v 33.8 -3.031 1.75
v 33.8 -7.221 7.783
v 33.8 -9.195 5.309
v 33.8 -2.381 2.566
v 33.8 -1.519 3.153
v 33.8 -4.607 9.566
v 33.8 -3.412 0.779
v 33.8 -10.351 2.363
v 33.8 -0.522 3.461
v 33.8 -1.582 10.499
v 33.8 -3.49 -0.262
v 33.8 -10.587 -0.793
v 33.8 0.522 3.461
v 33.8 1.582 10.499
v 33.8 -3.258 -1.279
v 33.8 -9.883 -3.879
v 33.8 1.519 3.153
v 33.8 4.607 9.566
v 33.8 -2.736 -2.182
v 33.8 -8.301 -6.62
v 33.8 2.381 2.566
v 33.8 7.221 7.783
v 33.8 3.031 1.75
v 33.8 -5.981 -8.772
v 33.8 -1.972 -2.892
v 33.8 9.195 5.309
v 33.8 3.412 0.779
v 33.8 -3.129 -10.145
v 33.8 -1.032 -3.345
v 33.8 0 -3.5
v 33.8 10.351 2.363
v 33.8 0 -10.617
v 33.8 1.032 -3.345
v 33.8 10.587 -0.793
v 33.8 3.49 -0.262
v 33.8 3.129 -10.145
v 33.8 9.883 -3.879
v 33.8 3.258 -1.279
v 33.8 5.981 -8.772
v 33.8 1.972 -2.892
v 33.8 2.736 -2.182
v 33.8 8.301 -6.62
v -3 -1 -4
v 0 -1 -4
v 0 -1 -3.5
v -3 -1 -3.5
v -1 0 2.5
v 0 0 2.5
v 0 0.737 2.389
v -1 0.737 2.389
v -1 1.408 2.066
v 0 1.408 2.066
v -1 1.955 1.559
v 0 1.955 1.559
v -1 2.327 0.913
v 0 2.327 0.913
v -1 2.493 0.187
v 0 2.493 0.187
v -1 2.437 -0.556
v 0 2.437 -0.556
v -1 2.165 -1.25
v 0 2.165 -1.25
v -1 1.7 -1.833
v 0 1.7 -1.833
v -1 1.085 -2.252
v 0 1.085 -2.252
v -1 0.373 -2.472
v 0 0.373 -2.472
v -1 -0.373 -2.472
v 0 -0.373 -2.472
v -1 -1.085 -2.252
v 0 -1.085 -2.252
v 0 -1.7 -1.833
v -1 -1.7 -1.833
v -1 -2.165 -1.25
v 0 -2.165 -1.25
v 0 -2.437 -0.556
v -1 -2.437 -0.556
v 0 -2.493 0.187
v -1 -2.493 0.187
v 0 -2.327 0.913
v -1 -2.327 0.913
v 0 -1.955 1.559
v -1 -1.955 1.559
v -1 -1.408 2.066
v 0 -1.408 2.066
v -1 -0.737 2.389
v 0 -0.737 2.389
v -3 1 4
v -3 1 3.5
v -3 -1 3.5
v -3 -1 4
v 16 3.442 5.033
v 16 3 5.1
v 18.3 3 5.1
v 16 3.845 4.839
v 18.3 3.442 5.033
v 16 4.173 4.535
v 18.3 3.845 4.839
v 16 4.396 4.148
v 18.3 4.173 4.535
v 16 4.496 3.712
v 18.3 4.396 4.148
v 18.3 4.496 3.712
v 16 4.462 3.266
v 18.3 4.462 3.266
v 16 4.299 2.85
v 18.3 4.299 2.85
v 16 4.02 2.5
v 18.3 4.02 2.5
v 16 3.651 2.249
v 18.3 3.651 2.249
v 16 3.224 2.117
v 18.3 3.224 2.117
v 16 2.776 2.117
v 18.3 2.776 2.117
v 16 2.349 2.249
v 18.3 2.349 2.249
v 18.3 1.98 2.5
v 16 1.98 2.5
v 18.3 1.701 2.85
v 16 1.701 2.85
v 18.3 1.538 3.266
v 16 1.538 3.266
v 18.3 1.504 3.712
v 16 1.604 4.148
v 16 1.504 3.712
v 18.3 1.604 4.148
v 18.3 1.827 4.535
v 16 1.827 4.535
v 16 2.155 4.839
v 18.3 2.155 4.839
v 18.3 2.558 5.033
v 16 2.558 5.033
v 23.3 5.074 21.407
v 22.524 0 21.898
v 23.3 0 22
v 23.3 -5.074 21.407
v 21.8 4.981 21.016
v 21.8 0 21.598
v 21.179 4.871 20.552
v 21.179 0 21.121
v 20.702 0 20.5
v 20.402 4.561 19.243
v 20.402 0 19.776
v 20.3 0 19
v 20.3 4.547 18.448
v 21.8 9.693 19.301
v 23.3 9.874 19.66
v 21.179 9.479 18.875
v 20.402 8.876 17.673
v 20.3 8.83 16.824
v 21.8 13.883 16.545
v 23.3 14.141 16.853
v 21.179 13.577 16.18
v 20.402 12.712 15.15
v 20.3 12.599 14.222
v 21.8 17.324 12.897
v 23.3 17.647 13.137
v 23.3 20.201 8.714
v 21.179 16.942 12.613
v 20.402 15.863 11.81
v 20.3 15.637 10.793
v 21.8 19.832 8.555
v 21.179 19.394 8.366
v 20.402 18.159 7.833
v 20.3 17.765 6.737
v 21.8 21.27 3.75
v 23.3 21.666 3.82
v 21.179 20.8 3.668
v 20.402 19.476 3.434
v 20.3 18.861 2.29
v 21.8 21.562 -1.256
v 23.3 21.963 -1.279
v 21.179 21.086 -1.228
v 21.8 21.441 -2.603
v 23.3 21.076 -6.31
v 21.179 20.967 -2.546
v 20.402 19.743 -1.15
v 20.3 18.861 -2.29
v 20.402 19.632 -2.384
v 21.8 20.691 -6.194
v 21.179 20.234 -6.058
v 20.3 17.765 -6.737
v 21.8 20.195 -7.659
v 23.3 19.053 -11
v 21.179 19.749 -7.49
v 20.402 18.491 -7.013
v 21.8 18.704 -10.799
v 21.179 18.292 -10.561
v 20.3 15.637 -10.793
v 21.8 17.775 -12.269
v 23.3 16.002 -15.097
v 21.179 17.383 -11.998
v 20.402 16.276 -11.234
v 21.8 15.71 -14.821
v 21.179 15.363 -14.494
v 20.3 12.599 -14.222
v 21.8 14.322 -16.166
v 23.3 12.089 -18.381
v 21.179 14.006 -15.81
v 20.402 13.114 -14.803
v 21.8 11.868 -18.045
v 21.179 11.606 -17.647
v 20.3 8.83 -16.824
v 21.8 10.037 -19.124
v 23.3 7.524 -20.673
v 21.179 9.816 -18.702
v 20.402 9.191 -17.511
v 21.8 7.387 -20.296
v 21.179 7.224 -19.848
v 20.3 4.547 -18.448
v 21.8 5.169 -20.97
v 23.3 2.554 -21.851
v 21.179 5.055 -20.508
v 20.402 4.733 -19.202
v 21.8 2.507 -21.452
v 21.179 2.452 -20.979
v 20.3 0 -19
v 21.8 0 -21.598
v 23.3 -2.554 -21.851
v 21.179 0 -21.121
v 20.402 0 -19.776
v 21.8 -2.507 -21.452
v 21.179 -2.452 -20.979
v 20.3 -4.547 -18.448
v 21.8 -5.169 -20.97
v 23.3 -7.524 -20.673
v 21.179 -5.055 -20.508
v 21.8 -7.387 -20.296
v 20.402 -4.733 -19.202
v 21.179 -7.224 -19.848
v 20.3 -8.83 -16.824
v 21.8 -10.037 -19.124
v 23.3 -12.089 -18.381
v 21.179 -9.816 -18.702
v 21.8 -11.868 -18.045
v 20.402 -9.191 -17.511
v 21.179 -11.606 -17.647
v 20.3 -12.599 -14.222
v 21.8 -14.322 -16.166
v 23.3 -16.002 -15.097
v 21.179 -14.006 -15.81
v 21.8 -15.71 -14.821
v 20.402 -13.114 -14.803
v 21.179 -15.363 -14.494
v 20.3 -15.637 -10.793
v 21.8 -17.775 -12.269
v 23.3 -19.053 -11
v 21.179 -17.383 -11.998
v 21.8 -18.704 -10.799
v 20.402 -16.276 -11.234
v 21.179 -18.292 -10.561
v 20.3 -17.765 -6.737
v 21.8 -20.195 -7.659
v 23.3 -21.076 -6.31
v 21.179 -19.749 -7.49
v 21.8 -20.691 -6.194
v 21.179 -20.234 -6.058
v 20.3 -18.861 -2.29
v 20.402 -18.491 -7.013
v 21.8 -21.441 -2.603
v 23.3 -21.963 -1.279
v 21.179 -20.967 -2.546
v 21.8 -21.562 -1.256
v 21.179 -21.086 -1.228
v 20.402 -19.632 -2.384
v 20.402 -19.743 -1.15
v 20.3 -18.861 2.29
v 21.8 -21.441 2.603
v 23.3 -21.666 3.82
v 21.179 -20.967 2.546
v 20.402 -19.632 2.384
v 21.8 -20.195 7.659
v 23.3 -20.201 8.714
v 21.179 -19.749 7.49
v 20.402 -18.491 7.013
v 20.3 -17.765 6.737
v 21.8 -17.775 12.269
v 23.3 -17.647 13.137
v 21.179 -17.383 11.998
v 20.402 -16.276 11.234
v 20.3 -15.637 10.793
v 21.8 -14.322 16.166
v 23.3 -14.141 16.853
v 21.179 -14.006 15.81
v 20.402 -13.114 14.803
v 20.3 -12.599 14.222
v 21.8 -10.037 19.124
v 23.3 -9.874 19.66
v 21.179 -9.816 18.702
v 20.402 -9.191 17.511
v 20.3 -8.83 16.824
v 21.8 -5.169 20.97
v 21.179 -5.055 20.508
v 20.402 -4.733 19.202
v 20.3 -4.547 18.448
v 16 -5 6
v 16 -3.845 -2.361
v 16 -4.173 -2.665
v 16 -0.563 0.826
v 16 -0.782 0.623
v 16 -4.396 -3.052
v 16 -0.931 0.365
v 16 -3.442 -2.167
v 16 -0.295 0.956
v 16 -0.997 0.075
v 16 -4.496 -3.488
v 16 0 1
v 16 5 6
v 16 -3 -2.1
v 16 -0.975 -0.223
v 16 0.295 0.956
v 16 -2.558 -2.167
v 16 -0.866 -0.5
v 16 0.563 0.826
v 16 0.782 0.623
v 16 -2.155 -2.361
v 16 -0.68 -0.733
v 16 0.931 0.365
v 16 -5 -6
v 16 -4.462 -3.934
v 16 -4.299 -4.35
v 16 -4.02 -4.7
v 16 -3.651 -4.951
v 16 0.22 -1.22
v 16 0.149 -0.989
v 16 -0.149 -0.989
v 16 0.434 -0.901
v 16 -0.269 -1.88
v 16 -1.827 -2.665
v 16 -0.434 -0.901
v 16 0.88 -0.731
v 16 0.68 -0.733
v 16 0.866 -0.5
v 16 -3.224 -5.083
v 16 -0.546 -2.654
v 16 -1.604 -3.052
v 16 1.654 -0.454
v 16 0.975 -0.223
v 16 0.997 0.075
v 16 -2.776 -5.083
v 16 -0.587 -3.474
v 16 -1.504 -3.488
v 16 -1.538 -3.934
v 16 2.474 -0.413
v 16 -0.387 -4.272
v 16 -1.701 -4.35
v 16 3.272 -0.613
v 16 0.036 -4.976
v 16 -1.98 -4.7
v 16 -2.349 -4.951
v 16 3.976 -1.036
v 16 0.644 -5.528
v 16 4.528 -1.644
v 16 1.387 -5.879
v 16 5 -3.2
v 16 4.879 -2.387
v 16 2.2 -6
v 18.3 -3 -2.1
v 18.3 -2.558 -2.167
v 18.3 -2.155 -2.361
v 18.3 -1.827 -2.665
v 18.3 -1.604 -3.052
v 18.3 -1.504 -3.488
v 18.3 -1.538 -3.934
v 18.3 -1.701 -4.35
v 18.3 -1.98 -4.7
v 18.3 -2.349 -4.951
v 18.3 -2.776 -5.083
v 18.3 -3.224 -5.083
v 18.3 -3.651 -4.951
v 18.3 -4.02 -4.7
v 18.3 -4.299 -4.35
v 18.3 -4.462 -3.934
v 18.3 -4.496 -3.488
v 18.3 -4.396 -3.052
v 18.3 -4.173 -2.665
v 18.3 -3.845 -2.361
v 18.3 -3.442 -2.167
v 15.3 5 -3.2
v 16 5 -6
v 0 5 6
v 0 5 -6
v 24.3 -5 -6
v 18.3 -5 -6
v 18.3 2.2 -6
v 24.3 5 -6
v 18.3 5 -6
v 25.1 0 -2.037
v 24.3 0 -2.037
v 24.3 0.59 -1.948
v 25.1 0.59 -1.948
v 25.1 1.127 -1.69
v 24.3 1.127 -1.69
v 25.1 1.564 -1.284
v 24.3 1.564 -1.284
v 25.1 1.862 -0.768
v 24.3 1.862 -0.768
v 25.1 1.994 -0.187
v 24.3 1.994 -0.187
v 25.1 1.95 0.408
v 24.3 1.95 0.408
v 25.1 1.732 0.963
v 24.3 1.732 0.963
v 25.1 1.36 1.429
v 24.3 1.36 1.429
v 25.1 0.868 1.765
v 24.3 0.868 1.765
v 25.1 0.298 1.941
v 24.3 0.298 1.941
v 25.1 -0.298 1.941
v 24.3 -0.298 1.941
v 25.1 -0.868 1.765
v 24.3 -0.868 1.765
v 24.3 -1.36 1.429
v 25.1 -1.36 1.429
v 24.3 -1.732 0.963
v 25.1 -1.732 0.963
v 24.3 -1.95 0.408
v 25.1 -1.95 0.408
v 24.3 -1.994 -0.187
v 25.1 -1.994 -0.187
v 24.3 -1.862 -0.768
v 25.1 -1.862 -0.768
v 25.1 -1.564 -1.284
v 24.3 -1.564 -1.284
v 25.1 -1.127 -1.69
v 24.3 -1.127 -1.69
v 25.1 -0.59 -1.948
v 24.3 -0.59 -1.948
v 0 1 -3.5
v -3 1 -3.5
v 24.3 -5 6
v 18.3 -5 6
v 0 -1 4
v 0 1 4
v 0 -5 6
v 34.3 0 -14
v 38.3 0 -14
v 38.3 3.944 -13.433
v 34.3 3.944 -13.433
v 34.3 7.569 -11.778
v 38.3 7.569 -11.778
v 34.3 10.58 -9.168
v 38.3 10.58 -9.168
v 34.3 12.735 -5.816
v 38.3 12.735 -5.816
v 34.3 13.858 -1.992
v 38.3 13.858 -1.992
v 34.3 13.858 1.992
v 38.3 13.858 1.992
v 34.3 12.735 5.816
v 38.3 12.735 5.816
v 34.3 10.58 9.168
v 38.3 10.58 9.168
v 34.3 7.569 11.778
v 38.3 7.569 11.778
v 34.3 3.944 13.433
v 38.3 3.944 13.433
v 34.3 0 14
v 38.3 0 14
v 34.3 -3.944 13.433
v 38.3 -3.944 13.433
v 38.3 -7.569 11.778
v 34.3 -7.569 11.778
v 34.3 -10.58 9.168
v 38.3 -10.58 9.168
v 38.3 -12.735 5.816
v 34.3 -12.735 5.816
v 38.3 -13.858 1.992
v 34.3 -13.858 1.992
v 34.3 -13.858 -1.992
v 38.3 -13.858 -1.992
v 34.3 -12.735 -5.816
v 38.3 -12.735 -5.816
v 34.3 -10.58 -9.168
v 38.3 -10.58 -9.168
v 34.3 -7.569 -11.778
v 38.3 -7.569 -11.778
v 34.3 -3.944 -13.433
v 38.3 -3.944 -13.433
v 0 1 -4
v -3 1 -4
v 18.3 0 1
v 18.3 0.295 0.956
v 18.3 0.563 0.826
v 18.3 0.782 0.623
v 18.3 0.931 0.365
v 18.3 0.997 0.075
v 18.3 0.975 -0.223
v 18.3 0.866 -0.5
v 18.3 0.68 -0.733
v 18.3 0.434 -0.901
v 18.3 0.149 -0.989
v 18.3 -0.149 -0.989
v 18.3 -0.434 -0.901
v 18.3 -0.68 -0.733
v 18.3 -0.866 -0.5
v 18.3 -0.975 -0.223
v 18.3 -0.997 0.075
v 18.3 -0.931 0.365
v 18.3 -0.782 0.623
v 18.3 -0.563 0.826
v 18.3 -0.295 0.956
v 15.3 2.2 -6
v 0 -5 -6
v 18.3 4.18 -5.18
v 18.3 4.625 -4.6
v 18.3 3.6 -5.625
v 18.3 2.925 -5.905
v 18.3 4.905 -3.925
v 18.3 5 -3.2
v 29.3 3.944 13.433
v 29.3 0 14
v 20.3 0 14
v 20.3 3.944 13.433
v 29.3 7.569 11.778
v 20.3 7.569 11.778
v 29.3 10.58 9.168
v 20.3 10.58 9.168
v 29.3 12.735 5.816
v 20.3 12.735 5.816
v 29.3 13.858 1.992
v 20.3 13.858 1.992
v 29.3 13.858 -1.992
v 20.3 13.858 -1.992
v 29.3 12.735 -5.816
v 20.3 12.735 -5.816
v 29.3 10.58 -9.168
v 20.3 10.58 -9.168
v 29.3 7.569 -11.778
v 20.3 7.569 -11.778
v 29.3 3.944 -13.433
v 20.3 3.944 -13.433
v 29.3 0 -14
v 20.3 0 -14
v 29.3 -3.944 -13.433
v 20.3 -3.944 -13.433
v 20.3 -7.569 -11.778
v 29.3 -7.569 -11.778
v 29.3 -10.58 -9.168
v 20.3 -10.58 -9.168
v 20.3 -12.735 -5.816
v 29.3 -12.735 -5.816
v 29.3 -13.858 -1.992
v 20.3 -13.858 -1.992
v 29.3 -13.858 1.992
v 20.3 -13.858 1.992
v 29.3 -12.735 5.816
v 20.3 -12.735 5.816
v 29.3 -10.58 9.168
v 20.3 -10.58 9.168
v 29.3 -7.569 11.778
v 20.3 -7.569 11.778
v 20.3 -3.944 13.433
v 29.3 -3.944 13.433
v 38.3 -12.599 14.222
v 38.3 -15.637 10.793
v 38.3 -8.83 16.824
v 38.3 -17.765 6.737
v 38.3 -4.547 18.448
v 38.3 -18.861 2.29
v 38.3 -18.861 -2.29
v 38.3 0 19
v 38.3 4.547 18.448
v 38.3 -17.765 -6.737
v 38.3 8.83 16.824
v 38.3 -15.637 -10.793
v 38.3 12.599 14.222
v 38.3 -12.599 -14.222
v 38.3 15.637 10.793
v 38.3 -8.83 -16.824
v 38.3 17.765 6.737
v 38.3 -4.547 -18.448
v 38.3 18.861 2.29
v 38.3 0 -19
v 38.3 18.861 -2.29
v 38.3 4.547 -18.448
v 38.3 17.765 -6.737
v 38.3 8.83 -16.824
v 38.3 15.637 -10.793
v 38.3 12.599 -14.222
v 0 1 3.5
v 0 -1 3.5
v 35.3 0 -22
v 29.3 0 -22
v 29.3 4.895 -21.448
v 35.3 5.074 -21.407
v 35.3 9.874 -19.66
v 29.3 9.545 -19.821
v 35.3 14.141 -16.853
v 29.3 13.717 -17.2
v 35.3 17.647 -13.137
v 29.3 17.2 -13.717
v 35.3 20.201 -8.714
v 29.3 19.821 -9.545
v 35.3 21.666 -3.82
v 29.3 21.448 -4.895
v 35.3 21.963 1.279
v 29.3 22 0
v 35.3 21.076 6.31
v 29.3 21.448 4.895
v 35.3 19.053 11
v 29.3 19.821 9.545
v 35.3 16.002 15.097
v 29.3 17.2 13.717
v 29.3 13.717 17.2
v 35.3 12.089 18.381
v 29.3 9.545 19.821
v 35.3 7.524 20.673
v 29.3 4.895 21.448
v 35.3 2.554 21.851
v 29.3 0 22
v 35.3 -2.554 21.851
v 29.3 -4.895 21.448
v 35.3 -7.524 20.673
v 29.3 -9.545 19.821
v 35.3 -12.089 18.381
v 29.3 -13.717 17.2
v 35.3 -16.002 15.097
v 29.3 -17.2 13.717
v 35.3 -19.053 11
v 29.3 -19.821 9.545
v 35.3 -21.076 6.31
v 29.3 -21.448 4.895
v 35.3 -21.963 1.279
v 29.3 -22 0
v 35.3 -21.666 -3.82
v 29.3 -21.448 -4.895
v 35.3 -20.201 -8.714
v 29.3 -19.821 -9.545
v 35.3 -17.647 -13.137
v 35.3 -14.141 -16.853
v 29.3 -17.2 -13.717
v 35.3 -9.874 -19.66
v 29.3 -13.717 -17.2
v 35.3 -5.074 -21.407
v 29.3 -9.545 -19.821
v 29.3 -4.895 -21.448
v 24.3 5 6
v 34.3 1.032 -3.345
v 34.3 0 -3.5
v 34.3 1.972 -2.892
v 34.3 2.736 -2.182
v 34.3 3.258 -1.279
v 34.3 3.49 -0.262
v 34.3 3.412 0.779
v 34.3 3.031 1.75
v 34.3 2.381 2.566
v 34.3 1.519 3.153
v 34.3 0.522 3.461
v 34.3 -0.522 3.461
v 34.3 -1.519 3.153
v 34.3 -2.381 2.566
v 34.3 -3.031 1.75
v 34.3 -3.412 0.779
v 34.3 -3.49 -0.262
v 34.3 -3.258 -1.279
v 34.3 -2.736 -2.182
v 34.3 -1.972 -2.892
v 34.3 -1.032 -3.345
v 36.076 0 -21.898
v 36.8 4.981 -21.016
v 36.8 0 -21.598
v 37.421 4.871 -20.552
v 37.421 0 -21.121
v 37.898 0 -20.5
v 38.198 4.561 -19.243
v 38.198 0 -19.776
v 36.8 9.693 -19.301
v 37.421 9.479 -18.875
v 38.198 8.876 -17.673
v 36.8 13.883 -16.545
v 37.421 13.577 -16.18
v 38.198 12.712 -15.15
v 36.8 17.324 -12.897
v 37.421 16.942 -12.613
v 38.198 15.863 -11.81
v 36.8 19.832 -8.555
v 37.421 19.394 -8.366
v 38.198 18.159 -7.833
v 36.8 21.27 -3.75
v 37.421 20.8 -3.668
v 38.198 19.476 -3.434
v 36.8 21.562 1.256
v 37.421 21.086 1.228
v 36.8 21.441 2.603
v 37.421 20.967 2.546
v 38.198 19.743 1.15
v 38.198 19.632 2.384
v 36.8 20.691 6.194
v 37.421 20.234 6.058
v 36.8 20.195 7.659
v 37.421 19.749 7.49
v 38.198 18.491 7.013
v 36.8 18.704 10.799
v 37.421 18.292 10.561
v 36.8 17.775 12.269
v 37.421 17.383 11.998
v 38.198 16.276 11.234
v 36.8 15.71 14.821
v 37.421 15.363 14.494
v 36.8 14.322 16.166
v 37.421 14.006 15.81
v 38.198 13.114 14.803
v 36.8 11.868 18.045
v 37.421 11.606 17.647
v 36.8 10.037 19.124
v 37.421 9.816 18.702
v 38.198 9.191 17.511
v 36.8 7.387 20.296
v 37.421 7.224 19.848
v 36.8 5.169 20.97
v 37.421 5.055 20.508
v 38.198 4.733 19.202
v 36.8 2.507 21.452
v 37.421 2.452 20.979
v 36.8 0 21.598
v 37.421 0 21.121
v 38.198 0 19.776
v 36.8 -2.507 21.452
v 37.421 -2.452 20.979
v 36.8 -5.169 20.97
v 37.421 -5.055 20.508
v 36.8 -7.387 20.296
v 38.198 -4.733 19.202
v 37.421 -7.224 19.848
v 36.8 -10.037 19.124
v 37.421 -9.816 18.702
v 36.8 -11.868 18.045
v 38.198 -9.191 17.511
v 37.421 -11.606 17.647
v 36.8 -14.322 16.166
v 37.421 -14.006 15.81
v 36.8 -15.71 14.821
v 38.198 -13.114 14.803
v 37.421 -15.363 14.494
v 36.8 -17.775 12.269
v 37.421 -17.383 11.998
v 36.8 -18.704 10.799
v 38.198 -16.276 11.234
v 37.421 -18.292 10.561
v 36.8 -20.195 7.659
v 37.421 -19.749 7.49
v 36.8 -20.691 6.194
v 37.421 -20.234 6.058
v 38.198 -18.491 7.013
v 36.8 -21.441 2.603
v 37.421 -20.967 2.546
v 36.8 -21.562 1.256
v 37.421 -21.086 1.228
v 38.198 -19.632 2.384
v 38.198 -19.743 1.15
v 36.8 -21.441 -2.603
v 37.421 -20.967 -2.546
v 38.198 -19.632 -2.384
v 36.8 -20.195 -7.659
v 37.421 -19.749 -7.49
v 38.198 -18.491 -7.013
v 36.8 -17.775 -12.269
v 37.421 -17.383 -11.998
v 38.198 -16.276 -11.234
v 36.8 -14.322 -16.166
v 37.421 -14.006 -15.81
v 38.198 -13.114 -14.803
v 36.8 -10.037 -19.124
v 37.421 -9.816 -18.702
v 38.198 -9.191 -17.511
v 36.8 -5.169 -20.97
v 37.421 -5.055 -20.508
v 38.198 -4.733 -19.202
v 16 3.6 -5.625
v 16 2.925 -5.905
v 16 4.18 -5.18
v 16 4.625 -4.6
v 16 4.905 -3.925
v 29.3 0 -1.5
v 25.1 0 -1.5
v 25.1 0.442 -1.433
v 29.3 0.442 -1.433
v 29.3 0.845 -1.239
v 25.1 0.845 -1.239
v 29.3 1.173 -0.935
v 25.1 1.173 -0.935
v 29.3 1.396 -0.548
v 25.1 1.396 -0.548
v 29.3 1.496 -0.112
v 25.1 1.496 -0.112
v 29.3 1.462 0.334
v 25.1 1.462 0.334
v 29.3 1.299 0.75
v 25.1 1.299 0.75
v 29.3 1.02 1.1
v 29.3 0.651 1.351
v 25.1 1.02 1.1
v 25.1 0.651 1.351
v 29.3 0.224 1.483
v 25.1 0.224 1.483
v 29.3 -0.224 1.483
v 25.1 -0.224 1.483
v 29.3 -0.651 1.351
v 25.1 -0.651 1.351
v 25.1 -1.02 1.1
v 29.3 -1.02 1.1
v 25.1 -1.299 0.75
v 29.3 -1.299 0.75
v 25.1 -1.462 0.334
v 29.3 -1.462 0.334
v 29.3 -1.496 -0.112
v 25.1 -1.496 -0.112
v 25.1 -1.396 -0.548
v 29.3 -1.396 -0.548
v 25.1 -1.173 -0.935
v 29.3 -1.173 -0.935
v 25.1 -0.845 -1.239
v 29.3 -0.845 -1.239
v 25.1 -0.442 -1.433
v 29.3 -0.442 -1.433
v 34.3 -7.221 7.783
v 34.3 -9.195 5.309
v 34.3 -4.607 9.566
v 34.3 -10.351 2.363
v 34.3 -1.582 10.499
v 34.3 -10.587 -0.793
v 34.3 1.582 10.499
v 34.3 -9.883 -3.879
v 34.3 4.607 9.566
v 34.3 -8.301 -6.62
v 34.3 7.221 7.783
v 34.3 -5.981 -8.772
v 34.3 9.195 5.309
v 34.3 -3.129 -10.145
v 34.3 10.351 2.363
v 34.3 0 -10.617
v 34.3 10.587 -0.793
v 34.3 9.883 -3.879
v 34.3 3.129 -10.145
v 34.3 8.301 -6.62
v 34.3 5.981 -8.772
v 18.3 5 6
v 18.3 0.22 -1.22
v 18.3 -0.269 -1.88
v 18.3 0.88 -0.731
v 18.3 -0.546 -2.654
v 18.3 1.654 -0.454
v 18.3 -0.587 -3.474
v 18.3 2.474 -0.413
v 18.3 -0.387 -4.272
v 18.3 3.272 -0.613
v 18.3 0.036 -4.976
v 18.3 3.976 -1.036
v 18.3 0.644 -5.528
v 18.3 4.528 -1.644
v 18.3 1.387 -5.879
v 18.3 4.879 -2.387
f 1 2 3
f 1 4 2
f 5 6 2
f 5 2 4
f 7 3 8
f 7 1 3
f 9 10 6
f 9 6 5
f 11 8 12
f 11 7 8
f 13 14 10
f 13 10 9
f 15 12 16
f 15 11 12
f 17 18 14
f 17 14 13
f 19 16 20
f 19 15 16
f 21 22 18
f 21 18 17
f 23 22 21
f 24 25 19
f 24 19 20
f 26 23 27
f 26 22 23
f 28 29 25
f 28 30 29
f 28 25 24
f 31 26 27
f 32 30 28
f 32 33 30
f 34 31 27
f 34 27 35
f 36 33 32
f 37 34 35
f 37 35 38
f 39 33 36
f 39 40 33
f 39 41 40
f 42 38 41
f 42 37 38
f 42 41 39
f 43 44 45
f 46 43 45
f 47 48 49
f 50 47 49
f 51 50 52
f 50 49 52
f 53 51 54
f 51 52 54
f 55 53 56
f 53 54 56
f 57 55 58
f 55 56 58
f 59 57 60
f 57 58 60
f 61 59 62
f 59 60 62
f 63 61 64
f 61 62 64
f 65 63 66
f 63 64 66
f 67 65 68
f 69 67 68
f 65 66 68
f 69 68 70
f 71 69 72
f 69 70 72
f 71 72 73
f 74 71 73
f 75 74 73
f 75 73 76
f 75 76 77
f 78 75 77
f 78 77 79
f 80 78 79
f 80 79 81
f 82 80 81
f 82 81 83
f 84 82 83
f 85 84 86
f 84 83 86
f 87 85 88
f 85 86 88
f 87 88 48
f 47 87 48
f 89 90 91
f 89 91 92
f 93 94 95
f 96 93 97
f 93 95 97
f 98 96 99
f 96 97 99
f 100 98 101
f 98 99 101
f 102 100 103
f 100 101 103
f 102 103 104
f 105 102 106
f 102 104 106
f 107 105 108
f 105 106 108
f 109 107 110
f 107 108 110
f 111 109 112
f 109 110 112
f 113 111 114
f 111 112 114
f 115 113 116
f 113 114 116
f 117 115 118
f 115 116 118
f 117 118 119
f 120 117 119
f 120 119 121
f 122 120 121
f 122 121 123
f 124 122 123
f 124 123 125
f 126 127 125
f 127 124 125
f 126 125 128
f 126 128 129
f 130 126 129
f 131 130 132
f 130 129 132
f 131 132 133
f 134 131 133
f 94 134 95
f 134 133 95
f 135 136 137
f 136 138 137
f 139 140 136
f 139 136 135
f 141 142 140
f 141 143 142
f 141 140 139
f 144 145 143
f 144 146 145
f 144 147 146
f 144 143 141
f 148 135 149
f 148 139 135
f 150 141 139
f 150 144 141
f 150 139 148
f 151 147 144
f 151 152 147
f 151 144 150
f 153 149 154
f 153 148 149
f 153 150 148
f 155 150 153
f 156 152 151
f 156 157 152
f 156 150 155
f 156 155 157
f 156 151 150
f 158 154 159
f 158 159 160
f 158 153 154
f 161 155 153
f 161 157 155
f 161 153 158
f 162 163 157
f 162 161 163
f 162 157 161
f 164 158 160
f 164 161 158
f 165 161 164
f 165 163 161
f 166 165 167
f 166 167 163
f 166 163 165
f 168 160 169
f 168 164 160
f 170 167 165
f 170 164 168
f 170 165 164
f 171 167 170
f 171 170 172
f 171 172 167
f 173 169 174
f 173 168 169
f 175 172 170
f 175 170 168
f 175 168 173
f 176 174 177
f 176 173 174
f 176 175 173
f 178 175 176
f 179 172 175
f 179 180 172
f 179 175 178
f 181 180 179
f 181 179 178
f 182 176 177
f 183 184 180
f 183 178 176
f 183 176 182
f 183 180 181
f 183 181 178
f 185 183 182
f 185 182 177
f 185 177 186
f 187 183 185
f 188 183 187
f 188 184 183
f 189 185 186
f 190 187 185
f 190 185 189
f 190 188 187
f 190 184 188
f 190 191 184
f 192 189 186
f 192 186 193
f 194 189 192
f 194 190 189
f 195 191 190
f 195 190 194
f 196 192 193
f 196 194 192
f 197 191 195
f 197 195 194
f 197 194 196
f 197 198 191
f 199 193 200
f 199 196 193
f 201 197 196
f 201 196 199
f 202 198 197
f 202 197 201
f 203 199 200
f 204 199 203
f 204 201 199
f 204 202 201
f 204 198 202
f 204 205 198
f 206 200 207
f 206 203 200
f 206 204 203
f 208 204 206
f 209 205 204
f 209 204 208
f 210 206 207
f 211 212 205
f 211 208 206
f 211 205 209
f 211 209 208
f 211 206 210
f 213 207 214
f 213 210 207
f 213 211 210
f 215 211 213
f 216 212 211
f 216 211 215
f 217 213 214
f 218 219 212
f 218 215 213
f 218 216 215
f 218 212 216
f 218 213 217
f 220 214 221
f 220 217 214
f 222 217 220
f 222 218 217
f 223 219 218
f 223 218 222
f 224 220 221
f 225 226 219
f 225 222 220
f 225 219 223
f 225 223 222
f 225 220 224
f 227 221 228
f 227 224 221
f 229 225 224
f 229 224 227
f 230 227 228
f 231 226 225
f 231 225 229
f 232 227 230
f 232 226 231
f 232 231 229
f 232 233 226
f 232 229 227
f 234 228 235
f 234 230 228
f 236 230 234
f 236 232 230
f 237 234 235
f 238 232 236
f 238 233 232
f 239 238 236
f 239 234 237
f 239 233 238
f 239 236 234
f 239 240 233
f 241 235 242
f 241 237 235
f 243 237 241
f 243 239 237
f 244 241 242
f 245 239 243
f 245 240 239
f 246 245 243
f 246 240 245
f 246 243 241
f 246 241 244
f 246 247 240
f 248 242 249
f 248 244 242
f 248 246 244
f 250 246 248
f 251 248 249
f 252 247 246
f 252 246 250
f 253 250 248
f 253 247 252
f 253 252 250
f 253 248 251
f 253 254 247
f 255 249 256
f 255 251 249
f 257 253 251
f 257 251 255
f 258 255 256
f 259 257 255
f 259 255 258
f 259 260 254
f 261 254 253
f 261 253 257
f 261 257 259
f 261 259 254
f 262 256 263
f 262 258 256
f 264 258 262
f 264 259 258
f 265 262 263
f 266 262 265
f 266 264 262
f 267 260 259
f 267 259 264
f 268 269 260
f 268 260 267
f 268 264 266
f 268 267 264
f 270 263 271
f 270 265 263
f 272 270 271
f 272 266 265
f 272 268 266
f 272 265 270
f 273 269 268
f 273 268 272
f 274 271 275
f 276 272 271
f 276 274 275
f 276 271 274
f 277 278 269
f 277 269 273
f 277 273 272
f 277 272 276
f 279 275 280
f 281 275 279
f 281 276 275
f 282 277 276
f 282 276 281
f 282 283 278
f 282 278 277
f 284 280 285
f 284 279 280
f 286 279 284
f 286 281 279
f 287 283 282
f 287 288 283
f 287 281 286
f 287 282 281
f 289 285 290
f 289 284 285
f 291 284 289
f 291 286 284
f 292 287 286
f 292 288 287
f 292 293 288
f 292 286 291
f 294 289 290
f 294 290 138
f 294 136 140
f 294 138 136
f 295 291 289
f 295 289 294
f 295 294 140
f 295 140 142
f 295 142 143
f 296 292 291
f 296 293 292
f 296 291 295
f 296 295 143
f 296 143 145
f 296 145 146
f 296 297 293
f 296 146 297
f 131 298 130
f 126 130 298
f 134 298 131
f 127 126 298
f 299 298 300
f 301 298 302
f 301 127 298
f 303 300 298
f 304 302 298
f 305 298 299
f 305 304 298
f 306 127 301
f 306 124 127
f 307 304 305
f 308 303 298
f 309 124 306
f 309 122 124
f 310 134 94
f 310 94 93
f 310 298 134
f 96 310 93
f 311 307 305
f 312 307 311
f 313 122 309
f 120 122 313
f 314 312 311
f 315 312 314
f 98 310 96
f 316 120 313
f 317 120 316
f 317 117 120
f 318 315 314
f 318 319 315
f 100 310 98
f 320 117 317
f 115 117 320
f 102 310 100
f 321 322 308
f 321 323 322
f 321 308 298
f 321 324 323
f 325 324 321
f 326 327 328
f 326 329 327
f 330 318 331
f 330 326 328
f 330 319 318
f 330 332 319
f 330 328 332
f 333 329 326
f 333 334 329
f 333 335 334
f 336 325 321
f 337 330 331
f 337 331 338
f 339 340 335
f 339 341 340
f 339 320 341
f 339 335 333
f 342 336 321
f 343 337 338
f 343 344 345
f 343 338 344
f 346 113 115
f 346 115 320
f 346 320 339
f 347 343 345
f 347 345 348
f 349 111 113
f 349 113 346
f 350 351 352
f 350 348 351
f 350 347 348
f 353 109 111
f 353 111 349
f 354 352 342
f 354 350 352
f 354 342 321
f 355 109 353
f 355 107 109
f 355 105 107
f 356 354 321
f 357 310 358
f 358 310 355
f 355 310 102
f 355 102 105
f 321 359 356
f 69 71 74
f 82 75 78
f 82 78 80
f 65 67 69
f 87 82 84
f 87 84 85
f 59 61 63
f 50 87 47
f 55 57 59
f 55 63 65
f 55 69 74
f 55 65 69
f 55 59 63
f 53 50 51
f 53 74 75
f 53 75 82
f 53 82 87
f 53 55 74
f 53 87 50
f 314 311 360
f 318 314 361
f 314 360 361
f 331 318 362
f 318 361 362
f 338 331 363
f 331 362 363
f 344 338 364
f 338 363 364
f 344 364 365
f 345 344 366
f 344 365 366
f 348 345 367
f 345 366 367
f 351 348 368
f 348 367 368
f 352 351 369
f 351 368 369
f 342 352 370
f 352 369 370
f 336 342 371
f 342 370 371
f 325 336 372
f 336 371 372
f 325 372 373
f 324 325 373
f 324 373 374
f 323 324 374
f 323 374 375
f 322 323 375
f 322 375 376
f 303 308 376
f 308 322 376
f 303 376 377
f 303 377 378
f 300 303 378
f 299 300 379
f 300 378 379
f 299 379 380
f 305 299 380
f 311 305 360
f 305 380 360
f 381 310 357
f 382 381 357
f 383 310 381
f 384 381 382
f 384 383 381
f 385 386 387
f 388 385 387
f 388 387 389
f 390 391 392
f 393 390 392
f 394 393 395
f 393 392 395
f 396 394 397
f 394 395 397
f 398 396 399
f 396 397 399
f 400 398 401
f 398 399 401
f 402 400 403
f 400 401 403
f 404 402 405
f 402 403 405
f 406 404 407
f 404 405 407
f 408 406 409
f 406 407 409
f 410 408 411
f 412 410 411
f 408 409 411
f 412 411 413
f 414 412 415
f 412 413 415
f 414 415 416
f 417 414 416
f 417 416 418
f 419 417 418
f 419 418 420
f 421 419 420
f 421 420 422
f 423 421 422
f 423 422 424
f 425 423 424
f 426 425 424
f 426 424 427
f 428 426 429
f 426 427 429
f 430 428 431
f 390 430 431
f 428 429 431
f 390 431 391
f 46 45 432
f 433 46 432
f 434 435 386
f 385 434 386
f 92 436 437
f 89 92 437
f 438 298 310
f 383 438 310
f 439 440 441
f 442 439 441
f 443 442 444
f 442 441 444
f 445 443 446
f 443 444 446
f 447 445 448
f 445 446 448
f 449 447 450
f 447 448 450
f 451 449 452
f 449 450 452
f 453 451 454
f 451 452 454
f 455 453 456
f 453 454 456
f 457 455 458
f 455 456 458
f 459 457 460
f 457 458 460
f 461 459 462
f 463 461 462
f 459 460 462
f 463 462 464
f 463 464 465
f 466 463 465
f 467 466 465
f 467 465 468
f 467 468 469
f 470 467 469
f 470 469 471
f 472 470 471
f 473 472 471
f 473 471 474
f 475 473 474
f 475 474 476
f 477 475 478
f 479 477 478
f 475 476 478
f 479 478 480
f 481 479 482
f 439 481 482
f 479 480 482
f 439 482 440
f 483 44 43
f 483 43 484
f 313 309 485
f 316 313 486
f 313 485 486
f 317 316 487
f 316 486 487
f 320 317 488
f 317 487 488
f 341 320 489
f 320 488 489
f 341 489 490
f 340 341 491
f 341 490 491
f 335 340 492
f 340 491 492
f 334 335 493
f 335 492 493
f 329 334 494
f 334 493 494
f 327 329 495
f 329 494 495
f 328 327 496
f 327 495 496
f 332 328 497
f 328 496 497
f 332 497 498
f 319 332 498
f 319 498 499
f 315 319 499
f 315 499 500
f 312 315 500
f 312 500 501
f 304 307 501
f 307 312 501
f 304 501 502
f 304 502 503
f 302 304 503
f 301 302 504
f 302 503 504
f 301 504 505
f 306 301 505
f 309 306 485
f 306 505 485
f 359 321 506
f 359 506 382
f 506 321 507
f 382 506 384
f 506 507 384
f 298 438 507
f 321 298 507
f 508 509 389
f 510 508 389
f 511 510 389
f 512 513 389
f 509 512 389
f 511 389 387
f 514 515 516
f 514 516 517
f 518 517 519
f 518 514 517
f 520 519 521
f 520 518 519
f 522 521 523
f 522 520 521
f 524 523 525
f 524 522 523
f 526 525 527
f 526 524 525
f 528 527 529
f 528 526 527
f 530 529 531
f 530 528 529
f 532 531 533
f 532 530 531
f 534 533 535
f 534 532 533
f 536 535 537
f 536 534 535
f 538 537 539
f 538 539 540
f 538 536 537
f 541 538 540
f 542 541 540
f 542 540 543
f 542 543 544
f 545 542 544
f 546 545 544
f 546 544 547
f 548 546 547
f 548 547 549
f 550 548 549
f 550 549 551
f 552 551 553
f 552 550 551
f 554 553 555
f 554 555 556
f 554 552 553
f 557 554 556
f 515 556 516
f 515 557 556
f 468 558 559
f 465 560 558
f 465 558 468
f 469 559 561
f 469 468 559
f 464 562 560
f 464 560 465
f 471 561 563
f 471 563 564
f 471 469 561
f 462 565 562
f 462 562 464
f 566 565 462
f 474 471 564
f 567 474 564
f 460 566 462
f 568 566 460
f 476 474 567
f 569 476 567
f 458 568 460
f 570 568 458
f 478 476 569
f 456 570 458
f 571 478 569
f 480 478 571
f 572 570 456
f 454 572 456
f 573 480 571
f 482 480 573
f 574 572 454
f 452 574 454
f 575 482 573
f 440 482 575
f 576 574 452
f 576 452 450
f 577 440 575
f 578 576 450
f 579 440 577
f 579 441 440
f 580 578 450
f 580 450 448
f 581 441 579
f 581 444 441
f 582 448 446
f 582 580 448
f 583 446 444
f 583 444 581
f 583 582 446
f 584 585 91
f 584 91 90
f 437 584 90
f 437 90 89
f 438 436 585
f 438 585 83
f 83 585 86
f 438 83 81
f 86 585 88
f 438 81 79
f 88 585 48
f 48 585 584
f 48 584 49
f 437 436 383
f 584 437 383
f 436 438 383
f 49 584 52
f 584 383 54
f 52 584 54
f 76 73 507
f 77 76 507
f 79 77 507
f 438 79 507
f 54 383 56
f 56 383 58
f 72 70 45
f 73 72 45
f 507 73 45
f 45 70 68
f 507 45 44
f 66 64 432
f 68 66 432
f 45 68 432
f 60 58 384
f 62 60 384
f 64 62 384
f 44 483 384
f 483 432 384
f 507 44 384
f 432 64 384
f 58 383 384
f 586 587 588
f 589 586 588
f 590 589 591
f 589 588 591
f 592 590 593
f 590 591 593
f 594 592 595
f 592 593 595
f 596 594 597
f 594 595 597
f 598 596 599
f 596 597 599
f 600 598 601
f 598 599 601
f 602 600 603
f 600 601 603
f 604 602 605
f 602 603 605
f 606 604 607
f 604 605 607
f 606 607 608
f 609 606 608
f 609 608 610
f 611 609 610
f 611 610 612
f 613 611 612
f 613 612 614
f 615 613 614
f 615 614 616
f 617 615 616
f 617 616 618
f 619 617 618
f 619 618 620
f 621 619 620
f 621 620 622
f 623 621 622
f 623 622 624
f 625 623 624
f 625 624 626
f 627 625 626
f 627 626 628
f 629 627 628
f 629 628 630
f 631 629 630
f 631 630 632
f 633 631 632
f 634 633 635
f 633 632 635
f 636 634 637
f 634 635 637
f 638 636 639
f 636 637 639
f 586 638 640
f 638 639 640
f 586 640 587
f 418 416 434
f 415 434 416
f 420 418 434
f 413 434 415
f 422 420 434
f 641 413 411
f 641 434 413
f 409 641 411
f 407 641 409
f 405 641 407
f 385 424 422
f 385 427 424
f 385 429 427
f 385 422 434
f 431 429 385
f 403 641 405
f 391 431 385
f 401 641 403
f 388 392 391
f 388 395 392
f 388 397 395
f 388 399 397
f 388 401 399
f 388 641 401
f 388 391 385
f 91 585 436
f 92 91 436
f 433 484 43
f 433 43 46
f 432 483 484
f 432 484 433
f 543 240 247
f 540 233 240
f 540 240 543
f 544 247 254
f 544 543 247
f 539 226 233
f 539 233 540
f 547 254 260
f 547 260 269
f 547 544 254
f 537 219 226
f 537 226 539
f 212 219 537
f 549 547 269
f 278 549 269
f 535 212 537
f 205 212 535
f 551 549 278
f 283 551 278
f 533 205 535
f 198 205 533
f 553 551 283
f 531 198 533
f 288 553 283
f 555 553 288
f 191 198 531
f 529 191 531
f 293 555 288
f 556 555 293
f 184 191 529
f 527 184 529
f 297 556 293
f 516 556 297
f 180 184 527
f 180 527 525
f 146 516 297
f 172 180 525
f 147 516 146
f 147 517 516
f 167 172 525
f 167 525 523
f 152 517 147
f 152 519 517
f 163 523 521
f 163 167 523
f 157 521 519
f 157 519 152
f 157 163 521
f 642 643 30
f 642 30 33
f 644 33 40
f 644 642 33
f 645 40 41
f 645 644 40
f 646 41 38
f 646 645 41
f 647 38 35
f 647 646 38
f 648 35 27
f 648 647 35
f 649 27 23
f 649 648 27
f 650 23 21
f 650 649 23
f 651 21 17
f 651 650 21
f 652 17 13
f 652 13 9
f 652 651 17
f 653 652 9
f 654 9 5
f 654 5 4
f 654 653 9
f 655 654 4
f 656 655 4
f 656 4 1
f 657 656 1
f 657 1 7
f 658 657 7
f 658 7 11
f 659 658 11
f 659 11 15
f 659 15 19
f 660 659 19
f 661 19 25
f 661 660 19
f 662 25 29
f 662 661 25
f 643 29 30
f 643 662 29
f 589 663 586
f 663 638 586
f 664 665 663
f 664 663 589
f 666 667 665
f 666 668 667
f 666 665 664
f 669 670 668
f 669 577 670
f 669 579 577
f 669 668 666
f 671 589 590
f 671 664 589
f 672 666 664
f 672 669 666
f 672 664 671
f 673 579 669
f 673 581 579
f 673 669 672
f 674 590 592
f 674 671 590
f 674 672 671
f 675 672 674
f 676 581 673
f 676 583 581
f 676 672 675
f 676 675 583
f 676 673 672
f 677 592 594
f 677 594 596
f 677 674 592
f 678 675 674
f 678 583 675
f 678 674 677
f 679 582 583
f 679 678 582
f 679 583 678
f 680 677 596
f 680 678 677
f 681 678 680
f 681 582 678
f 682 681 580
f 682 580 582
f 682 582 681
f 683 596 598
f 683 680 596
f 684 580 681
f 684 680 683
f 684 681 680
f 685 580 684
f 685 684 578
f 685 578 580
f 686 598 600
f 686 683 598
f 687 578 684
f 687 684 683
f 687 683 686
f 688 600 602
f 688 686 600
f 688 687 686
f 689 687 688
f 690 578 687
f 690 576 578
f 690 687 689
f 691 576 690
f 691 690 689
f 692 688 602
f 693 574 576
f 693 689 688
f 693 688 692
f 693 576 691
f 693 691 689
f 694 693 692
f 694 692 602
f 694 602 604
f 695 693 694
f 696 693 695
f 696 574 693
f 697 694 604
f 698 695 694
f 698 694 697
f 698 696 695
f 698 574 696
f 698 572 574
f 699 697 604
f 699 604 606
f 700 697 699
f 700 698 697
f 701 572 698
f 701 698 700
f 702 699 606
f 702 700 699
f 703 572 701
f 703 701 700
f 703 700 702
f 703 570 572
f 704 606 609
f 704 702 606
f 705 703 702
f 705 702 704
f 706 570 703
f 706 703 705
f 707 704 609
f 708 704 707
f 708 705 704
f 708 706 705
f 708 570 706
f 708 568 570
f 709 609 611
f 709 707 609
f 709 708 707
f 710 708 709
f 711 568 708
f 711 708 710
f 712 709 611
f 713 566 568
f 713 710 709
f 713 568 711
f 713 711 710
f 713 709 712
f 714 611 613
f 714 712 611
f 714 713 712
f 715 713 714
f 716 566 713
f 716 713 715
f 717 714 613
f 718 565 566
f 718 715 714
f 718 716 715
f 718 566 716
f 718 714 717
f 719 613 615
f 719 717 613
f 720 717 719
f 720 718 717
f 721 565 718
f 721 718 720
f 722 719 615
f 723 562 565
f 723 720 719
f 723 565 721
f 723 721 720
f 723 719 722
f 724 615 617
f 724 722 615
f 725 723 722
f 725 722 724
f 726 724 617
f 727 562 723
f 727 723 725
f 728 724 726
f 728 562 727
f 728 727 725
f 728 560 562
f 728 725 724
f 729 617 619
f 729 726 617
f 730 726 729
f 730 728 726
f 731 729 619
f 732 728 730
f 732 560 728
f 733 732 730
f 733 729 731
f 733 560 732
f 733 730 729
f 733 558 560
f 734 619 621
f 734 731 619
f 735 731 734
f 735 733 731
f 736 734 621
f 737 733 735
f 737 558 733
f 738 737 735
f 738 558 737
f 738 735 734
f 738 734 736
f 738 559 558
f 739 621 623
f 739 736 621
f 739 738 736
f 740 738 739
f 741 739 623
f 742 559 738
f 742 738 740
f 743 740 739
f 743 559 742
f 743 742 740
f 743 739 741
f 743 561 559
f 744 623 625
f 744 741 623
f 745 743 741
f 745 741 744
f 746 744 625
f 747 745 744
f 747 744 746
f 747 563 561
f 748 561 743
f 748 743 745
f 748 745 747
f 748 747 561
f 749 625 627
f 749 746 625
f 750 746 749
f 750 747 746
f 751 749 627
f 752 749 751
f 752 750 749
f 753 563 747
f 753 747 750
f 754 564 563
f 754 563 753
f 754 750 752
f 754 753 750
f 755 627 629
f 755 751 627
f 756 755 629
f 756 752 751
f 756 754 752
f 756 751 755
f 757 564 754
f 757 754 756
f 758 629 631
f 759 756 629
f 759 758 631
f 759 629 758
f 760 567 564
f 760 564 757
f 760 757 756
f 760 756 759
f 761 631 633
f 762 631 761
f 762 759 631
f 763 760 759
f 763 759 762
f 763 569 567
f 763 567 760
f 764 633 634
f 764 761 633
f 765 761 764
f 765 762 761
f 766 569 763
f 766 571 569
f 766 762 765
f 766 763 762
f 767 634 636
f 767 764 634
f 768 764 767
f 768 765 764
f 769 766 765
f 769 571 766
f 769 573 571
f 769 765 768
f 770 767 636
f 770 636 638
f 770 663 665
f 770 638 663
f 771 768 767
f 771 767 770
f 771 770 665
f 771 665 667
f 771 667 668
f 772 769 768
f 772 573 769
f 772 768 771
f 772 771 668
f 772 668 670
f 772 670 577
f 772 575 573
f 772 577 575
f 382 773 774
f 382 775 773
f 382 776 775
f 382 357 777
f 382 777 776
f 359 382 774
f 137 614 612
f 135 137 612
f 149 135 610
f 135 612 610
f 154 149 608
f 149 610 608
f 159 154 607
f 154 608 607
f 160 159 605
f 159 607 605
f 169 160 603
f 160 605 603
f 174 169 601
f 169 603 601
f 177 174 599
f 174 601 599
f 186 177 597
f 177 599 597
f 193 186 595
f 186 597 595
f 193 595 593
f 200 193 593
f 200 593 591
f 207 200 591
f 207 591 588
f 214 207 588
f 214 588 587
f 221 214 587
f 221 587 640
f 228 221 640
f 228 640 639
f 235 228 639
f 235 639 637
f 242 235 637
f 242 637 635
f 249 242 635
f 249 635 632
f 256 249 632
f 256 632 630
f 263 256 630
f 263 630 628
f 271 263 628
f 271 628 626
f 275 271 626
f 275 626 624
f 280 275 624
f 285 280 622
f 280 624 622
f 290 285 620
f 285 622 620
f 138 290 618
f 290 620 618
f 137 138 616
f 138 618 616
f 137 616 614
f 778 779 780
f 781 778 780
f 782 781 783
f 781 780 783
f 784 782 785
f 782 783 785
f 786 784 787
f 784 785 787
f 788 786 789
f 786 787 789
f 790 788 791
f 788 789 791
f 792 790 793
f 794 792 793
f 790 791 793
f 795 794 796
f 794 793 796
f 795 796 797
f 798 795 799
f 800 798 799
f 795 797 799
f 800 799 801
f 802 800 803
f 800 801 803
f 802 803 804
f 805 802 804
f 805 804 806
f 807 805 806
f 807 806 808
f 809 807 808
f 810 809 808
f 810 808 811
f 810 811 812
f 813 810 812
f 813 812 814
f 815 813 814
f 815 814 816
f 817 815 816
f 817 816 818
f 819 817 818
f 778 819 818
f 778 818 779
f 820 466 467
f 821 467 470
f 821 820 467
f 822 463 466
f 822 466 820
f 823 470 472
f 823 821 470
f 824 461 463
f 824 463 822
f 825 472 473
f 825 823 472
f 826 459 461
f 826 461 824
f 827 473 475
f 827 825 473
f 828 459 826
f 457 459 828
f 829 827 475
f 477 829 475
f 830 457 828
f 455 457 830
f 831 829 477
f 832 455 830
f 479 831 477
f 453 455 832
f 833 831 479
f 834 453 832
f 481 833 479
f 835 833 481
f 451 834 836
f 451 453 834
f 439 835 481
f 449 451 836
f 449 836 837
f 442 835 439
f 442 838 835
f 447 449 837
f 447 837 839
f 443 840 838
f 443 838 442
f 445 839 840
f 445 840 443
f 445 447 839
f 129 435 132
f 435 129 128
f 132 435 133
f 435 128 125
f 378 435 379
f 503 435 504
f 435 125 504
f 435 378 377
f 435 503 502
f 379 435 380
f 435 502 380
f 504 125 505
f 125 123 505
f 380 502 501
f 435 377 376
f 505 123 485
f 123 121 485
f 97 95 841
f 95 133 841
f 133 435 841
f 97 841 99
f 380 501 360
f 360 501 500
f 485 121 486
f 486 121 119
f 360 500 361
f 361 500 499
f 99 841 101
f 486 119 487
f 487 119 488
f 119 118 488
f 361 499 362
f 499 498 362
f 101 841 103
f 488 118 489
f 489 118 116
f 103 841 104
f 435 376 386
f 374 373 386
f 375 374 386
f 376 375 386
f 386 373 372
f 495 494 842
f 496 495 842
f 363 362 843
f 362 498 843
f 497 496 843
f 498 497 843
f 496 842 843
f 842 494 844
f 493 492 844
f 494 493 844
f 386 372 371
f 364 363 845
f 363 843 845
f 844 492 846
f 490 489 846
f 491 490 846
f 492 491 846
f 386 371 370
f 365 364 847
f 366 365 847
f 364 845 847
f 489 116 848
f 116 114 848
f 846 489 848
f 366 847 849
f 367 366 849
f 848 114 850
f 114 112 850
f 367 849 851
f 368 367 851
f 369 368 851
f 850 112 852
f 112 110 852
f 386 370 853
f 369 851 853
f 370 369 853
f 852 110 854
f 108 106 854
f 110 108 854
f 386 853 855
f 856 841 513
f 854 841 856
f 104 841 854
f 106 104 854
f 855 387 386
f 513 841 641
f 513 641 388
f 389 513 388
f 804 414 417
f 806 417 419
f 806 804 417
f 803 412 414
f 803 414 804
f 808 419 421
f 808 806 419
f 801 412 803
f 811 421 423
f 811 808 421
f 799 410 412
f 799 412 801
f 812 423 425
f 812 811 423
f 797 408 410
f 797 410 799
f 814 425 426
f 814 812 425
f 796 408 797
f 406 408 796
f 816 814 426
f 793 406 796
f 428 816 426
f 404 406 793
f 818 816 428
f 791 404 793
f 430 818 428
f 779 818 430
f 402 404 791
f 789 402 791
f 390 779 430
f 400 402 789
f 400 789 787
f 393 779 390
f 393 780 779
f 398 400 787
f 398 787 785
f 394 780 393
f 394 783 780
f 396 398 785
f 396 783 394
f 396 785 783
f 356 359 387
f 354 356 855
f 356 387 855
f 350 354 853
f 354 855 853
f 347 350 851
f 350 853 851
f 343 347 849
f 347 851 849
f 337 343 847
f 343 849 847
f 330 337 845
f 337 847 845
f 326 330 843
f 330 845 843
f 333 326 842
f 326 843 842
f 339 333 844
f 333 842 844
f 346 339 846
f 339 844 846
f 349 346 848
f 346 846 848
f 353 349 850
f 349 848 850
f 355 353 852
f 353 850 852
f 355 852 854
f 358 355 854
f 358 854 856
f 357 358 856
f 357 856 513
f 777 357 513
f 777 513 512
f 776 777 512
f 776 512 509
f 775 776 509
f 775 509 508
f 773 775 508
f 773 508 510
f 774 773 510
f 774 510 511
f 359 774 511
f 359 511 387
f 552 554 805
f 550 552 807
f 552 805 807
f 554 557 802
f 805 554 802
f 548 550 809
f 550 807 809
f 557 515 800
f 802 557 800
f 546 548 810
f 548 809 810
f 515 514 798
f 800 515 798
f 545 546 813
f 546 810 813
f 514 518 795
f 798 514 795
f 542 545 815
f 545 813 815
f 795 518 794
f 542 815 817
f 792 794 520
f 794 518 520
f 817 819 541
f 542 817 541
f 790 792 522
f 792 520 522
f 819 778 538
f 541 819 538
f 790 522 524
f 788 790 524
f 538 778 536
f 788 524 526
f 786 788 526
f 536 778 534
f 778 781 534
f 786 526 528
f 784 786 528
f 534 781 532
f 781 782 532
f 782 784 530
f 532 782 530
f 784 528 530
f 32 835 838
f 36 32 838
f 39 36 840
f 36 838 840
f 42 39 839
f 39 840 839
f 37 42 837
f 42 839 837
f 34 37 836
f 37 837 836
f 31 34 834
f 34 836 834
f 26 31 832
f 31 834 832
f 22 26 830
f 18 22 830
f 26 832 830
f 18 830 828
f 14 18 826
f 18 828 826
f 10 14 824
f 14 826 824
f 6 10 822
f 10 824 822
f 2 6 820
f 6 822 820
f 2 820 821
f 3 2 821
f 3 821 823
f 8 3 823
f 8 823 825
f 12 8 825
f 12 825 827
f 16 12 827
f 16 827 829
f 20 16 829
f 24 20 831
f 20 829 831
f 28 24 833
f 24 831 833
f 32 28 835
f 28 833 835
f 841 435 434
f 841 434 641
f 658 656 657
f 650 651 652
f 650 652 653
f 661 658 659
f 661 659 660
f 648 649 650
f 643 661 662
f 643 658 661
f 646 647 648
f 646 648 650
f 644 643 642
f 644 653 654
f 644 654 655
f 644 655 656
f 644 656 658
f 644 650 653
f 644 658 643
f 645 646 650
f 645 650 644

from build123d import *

# Parameters (mm, degrees)
SKETCH_8_W            = 12
SKETCH_8_H            = 10
EXTRUDE_1_DEPTH       = 24.3
SKETCH_10_R           = 1.5
EXTRUDE_2_DEPTH       = 5
SKETCH_11_R           = 2
EXTRUDE_3_DEPTH       = 0.8
SKETCH_12_R           = 2.5
EXTRUDE_4_DEPTH       = 1
SKETCH_13_R           = 22
EXTRUDE_1_2_DEPTH     = 9
SKETCH_15_R           = 14
CUT_EXTRUDE_3_DEPTH   = 4
SKETCH_16_R           = 22
SKETCH_16_R_2         = 14
EXTRUDE_7_DEPTH       = 9
SKETCH_17_W           = 2.3
SKETCH_17_H           = 12
CUT_EXTRUDE_3_2_DEPTH = 12
SKETCH_18_R           = 1
SKETCH_18_R_2         = 1.5
SKETCH_18_R_3         = 2.8
EXTRUDE_8_DEPTH       = 3
FILLET_1_R            = 3
FILLET_2_R            = 3
SKETCH_20_W           = 0.5
SKETCH_20_H           = 2
EXTRUDE_9_DEPTH       = 3
SKETCH_21_R           = 10.617088877
SKETCH_21_R_2         = 3.5
CUT_EXTRUDE_5_DEPTH   = 0.5


with BuildPart() as part:
    # 草图8 → Extrude 1 (new body)
    with BuildSketch(Plane(origin=(0, 0, 0), x_dir=(0, 0, -1), z_dir=(1, 0, 0))):
        Rectangle(SKETCH_8_W, SKETCH_8_H)
    extrude(amount=EXTRUDE_1_DEPTH)

    # 草图10 → 电机2 (add)
    with BuildSketch(Plane(origin=(24.3, 0, 0), x_dir=(0, 0, -1), z_dir=(1, 0, 0))):
        Circle(SKETCH_10_R)
    extrude(amount=EXTRUDE_2_DEPTH)

    # 草图11 → 电机3 (add)
    with BuildSketch(Plane(origin=(24.3, 0, 0), x_dir=(0, 0, -1), z_dir=(1, 0, 0))):
        with Locations((0.037058569, 0)):
            Circle(SKETCH_11_R)
    extrude(amount=EXTRUDE_3_DEPTH)

    # 草图12 → 电机4 (add)
    with BuildSketch(Plane.ZY):
        Circle(SKETCH_12_R)
    extrude(amount=EXTRUDE_4_DEPTH)

    # 草图13 → Extrude 1 2 (add)
    with BuildSketch(Plane(origin=(29.3, 0, 0), x_dir=(0, 0, -1), z_dir=(1, 0, 0))):
        Circle(SKETCH_13_R)
    extrude(amount=EXTRUDE_1_2_DEPTH)

    # 草图15 → Cut-Extrude 3 (cut)
    with BuildSketch(Plane(origin=(38.3, 0, 0), x_dir=(0, 0, -1), z_dir=(1, 0, 0))):
        Circle(SKETCH_15_R)
    extrude(amount=-CUT_EXTRUDE_3_DEPTH, mode=Mode.SUBTRACT)

    # 草图16 → 凸台-拉伸7 (add)
    with BuildSketch(Plane.ZY.offset(-29.3)):
        Circle(SKETCH_16_R)
        Circle(SKETCH_16_R_2, mode=Mode.SUBTRACT)
    extrude(amount=EXTRUDE_7_DEPTH)

    # 草图17 → Cut-Extrude 3 2 (cut)
    with BuildSketch(Plane(origin=(0, 5, 0), x_dir=(1, 0, 0), z_dir=(0, 1, 0))):
        with Locations((17.15, 0)):
            Rectangle(SKETCH_17_W, SKETCH_17_H)
    extrude(amount=-CUT_EXTRUDE_3_2_DEPTH, mode=Mode.SUBTRACT)


with BuildPart() as cut_extrude_3_2_piece_1:
    # of the separate pieces the step leaves, piece 1, a body of its own (cut_extrude_3_2_pieces)
    add(part.part.solids().sort_by_distance((29.3, 0, -22))[0])



with BuildPart() as cut_extrude_3_2_piece_2:
    # of the separate pieces the step leaves, piece 2, a body of its own (cut_extrude_3_2_pieces)
    add(part.part.solids().sort_by_distance((0, 5, 6))[0])


with BuildPart() as cut_extrude_3_2_piece_1_1:
    add(cut_extrude_3_2_piece_1.part)

    add(cut_extrude_3_2_piece_2.part)  # 凸台-拉伸8 merges Cut-Extrude 3 2 piece 2
    # 草图18 → 凸台-拉伸8 (add)
    with BuildSketch(Plane.ZY.offset(-18.3)):
        Circle(SKETCH_18_R)
        with Locations((3.6, 3)):
            Circle(SKETCH_18_R_2)
        with Locations((-3.6, -3)):
            Circle(SKETCH_18_R_2)
        with Locations(Location((-3.2, 2.2, 0), (0, 0, 180))):
            Circle(SKETCH_18_R_3)
    extrude(amount=EXTRUDE_8_DEPTH)

    # 圆角1
    fillet_1_edges = [cut_extrude_3_2_piece_1_1.edges().sort_by_distance(p)[0] for p in [
        (38.3, 0, 22),
    ]]
    fillet(fillet_1_edges, radius=FILLET_1_R)

    # 圆角2
    fillet_2_edges = [cut_extrude_3_2_piece_1_1.edges().sort_by_distance(p)[0] for p in [
        (20.3, 0, -22),
    ]]
    fillet(fillet_2_edges, radius=FILLET_2_R)

    # 草图20 → 凸台-拉伸9 (add)
    with BuildSketch(Plane.ZY):
        with Locations((3.75, 0)):
            Rectangle(SKETCH_20_W, SKETCH_20_H)
        with Locations((-3.75, 0)):
            Rectangle(SKETCH_20_W, SKETCH_20_H)
    extrude(amount=EXTRUDE_9_DEPTH)

    # 草图21 → 切除-拉伸5 (cut)
    with BuildSketch(Plane(origin=(34.3, 0, 0), x_dir=(0, 0, -1), z_dir=(1, 0, 0))):
        Circle(SKETCH_21_R)
        Circle(SKETCH_21_R_2, mode=Mode.SUBTRACT)
    extrude(amount=-CUT_EXTRUDE_5_DEPTH, mode=Mode.SUBTRACT)


solid = cut_extrude_3_2_piece_1_1.part
